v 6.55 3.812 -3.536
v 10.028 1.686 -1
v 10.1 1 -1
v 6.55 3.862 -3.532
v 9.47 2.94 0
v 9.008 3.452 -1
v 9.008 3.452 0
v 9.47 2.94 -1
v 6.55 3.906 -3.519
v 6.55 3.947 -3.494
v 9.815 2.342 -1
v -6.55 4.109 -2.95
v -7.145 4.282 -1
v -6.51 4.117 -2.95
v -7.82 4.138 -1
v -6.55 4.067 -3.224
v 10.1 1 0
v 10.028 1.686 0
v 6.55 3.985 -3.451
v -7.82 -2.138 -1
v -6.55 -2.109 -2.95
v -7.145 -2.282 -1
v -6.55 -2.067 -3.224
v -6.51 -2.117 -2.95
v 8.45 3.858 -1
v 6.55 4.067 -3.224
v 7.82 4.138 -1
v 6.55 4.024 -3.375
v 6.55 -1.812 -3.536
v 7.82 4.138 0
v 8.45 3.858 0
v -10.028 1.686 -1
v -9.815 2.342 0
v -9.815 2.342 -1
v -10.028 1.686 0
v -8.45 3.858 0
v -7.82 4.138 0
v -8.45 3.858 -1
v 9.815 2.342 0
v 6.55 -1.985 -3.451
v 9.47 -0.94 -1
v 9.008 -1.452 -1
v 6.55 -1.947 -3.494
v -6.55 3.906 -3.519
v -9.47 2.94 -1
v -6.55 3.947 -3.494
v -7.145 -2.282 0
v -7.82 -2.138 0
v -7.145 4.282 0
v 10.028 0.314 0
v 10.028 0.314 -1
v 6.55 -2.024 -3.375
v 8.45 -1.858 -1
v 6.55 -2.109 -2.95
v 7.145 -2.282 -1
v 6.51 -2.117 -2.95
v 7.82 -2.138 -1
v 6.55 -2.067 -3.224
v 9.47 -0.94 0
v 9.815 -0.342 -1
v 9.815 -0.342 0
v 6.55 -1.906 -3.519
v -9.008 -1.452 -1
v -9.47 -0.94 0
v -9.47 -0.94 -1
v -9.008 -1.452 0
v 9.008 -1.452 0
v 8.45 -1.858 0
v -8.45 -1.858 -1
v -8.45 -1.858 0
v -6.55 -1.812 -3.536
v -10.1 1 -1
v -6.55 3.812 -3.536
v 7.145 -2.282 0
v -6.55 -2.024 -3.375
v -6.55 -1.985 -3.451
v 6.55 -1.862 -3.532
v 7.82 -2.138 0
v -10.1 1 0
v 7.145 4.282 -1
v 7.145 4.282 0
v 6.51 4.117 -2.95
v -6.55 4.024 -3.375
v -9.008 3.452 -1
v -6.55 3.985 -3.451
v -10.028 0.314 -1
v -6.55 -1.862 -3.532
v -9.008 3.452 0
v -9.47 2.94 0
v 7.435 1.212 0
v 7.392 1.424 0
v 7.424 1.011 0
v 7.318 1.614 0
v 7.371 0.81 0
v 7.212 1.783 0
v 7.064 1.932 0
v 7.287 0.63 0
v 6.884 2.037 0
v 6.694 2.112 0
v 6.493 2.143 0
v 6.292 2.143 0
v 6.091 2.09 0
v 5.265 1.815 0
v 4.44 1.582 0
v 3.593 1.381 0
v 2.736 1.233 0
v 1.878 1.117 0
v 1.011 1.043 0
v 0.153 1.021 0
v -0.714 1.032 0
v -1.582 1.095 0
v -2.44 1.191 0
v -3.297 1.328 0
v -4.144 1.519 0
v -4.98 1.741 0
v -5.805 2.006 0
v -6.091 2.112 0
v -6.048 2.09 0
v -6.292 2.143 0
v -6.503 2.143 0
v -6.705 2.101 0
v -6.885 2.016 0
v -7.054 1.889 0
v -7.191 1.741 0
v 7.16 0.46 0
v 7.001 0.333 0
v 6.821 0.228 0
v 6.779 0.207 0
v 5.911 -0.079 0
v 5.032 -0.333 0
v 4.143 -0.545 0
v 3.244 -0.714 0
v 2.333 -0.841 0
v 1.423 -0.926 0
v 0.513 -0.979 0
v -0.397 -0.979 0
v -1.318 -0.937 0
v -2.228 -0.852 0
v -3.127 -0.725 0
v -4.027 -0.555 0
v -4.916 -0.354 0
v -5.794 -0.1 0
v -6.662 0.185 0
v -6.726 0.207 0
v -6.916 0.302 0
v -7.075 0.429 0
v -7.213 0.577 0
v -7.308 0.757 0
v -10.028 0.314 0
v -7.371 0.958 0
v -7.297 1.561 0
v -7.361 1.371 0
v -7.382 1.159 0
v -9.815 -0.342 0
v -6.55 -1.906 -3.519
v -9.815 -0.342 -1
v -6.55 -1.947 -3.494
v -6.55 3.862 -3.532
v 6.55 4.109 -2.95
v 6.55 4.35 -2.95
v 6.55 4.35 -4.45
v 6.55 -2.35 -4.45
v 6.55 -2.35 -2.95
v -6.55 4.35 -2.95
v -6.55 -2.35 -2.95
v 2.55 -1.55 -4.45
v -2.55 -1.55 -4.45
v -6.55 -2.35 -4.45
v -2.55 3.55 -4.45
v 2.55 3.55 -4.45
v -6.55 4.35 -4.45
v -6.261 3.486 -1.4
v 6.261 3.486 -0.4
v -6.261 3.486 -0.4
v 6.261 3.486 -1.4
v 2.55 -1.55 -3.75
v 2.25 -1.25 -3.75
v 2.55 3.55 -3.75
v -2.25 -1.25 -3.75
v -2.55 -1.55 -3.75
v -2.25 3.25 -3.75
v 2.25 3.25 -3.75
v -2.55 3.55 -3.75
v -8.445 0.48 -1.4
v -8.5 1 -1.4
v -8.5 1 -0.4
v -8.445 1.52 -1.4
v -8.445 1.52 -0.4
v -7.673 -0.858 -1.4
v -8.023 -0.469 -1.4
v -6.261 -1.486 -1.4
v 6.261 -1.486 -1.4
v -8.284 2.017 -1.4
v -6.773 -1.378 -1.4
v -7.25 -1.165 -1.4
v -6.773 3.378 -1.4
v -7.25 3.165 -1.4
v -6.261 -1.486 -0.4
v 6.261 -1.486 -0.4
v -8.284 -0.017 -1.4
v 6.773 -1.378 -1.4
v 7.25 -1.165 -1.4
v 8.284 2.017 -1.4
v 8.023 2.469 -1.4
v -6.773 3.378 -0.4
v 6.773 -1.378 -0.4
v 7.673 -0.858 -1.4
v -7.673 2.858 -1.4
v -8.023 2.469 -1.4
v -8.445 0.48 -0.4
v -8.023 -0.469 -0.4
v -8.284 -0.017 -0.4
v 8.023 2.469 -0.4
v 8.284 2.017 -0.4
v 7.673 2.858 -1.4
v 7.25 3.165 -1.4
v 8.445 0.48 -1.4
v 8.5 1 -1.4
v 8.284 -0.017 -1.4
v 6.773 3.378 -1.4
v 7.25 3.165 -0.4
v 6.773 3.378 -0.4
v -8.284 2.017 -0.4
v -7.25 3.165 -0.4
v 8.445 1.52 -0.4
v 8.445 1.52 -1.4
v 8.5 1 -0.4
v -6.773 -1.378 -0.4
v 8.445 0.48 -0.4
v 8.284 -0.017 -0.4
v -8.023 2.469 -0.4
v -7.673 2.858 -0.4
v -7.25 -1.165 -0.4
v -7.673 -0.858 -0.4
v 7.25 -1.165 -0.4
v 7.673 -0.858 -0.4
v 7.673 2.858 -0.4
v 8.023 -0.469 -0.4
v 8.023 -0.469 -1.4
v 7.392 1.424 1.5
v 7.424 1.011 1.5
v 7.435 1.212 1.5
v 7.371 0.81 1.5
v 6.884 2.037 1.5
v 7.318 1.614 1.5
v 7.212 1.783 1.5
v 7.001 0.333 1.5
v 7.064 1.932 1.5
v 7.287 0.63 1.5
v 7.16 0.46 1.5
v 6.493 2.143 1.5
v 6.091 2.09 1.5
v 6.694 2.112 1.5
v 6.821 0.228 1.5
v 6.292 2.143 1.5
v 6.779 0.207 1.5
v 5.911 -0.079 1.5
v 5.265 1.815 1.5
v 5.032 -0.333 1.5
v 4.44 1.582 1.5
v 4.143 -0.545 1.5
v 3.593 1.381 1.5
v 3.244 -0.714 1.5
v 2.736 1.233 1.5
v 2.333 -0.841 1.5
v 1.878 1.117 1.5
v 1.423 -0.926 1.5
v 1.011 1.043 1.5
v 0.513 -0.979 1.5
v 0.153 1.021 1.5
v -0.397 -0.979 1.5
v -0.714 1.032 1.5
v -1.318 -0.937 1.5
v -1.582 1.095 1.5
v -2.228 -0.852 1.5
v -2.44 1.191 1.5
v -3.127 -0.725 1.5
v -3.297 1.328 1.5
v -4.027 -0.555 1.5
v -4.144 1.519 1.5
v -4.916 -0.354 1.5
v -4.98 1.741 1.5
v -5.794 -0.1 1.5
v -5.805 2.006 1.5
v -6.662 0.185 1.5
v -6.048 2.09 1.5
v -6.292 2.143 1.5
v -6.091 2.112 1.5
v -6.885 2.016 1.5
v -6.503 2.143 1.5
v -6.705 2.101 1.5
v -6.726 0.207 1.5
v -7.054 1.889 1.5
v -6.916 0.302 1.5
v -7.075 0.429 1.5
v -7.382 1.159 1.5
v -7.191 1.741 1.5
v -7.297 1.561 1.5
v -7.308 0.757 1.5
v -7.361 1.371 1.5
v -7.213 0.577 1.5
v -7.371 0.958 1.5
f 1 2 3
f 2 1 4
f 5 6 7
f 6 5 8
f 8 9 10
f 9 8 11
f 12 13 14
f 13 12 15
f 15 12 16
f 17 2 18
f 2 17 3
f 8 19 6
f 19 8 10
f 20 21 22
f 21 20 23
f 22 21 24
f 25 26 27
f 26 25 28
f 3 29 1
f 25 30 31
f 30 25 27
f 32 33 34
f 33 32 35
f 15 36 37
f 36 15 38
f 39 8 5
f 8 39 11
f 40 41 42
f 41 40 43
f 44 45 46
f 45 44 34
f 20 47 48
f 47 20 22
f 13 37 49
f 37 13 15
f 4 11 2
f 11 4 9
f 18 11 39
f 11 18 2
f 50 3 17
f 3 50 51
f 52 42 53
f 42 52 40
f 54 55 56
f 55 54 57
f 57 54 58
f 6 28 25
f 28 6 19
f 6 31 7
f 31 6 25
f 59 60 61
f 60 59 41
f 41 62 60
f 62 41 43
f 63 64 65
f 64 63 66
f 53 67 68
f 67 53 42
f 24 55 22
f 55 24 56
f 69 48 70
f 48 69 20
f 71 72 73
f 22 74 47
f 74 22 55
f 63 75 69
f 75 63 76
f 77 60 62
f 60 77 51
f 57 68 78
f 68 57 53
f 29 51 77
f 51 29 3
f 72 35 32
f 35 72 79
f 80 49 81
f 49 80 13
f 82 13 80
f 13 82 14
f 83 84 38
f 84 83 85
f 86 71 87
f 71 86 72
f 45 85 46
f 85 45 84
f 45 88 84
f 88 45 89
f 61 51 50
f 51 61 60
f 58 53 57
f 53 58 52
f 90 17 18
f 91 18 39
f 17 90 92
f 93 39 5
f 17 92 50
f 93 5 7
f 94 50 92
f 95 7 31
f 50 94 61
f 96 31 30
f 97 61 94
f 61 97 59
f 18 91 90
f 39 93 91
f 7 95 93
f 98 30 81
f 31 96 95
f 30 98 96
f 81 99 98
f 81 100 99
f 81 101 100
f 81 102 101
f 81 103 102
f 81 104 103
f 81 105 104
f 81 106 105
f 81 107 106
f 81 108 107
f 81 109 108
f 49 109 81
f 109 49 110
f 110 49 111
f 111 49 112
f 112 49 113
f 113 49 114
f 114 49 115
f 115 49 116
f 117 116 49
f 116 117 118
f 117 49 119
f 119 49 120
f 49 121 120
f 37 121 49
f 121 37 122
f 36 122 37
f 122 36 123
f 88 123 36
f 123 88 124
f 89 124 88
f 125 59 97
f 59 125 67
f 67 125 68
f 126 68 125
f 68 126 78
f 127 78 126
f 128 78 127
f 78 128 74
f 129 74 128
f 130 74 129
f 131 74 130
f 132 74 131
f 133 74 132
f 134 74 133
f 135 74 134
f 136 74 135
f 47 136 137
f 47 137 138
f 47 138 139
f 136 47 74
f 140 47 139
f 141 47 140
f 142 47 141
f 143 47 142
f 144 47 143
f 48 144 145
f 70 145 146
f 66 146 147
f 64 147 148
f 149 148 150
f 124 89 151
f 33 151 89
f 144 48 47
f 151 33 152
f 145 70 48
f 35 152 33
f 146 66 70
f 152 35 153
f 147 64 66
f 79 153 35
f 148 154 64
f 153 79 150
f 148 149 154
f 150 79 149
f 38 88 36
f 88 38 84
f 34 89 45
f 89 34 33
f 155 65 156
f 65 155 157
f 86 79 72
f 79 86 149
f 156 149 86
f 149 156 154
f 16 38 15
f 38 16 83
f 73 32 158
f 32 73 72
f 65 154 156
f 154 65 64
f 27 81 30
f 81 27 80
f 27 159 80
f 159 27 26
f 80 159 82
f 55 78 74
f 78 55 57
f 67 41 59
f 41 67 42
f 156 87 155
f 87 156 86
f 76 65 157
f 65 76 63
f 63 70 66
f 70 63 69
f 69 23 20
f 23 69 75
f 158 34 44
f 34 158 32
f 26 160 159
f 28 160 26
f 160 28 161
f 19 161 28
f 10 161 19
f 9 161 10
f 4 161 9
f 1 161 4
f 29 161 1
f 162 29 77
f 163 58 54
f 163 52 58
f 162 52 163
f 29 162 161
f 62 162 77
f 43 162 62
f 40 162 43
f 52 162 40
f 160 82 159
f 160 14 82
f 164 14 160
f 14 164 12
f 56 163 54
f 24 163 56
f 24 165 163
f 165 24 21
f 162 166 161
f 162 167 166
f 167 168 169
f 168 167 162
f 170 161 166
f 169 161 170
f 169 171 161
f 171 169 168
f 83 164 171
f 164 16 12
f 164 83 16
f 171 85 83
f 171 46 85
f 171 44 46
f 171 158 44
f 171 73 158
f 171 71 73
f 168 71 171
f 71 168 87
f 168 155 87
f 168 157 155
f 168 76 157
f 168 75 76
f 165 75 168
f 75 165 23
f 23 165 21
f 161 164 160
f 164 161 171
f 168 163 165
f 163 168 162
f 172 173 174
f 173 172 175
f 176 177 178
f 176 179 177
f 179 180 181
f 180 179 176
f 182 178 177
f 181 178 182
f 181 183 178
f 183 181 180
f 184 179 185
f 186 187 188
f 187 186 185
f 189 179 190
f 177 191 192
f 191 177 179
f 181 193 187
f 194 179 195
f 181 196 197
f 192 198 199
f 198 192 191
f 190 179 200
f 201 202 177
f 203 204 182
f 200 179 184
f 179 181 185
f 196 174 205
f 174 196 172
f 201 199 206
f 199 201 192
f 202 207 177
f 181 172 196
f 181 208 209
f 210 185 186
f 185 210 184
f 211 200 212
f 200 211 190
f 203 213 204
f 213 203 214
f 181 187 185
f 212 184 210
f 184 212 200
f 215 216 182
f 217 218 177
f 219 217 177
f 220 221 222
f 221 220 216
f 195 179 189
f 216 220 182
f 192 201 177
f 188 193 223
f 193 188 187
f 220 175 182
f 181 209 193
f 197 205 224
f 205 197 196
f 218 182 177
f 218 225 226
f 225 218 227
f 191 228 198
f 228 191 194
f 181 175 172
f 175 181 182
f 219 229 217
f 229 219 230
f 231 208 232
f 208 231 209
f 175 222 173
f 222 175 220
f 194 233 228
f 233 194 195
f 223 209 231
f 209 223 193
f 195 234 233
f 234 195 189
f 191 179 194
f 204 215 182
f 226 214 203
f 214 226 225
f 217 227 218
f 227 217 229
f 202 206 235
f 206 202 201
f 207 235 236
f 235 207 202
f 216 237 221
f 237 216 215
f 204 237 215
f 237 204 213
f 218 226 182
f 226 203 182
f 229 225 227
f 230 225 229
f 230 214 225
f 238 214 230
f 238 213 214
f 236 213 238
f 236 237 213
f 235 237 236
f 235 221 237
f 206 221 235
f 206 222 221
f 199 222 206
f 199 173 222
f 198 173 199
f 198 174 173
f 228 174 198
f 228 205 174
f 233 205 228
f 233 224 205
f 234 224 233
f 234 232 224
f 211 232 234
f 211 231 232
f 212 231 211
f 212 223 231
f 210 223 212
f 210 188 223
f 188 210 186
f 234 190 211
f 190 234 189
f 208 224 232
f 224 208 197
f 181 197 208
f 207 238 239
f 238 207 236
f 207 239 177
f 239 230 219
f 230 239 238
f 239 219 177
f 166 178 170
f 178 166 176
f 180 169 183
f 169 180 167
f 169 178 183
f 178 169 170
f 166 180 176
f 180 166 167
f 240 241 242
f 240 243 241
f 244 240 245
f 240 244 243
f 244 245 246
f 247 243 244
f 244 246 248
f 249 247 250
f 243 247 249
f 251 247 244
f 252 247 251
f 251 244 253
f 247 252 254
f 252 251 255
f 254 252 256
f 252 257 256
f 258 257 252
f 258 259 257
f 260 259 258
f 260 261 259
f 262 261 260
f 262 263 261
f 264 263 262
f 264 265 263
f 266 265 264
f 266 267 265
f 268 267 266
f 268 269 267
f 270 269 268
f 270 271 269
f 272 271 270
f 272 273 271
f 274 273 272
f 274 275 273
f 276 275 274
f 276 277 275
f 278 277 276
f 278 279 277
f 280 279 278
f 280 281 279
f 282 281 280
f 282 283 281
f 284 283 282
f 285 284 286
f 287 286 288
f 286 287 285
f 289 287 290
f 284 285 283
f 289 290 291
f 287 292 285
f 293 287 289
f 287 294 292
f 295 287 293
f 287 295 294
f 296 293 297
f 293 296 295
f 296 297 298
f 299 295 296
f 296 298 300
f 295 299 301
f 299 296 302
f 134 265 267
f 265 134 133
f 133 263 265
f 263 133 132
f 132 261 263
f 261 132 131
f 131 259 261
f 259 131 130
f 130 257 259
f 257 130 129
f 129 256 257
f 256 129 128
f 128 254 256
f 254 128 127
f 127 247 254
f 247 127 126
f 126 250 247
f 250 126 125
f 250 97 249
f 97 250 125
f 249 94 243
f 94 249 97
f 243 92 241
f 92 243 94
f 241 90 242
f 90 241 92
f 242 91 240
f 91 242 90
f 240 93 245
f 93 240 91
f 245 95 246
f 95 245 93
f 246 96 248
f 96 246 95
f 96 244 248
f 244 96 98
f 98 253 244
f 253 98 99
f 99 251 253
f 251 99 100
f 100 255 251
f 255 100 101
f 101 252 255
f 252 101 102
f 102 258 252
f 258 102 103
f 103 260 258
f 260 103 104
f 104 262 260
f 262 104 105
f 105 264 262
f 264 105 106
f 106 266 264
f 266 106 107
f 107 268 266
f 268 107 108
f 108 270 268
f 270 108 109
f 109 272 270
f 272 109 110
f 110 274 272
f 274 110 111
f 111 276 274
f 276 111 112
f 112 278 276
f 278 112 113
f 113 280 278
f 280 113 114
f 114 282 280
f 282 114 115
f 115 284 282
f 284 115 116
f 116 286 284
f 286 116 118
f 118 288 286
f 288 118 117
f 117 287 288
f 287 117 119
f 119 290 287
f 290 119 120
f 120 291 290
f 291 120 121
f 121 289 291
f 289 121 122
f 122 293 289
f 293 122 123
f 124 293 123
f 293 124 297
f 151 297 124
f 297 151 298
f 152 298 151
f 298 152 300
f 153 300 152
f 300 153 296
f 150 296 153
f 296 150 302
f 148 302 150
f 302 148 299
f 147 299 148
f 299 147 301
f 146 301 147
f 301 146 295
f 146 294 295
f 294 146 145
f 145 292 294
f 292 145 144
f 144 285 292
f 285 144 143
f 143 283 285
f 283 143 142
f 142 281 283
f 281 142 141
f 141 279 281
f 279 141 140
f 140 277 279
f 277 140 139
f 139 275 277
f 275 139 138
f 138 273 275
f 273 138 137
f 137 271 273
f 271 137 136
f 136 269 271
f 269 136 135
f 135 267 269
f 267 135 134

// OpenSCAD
main(1.5);
difference(){
    reflector(0.8);
    reflector(0);
}

module reflector(wall){
    hull(){
        translate([0,1,-1.4+wall/2])hull(){
            translate([-6-wall,0,0])cylinder(d=5+wall*2,h=1,$fn=30);
            translate([6+wall,0,0])cylinder(d=5+wall*2,h=1,$fn=30);
        }
        translate([0,1,-3])cube([4.5+wall*10,4.5+wall*2,1.5],true);;
    }
    translate([0,1,-4.5+wall])cube([5.1+wall*10,5.1+wall*2,1.5],true);
}

module main(hght){
    color("lightgreen")translate([-23.4/2,-1,0])linear_extrude(hght)
        scale([0.25,0.25,0.25])import("../DXF/XLR_led.dxf");
}

module led(){
    color("white")cube([5.1,5.1,1.5],true);
}
